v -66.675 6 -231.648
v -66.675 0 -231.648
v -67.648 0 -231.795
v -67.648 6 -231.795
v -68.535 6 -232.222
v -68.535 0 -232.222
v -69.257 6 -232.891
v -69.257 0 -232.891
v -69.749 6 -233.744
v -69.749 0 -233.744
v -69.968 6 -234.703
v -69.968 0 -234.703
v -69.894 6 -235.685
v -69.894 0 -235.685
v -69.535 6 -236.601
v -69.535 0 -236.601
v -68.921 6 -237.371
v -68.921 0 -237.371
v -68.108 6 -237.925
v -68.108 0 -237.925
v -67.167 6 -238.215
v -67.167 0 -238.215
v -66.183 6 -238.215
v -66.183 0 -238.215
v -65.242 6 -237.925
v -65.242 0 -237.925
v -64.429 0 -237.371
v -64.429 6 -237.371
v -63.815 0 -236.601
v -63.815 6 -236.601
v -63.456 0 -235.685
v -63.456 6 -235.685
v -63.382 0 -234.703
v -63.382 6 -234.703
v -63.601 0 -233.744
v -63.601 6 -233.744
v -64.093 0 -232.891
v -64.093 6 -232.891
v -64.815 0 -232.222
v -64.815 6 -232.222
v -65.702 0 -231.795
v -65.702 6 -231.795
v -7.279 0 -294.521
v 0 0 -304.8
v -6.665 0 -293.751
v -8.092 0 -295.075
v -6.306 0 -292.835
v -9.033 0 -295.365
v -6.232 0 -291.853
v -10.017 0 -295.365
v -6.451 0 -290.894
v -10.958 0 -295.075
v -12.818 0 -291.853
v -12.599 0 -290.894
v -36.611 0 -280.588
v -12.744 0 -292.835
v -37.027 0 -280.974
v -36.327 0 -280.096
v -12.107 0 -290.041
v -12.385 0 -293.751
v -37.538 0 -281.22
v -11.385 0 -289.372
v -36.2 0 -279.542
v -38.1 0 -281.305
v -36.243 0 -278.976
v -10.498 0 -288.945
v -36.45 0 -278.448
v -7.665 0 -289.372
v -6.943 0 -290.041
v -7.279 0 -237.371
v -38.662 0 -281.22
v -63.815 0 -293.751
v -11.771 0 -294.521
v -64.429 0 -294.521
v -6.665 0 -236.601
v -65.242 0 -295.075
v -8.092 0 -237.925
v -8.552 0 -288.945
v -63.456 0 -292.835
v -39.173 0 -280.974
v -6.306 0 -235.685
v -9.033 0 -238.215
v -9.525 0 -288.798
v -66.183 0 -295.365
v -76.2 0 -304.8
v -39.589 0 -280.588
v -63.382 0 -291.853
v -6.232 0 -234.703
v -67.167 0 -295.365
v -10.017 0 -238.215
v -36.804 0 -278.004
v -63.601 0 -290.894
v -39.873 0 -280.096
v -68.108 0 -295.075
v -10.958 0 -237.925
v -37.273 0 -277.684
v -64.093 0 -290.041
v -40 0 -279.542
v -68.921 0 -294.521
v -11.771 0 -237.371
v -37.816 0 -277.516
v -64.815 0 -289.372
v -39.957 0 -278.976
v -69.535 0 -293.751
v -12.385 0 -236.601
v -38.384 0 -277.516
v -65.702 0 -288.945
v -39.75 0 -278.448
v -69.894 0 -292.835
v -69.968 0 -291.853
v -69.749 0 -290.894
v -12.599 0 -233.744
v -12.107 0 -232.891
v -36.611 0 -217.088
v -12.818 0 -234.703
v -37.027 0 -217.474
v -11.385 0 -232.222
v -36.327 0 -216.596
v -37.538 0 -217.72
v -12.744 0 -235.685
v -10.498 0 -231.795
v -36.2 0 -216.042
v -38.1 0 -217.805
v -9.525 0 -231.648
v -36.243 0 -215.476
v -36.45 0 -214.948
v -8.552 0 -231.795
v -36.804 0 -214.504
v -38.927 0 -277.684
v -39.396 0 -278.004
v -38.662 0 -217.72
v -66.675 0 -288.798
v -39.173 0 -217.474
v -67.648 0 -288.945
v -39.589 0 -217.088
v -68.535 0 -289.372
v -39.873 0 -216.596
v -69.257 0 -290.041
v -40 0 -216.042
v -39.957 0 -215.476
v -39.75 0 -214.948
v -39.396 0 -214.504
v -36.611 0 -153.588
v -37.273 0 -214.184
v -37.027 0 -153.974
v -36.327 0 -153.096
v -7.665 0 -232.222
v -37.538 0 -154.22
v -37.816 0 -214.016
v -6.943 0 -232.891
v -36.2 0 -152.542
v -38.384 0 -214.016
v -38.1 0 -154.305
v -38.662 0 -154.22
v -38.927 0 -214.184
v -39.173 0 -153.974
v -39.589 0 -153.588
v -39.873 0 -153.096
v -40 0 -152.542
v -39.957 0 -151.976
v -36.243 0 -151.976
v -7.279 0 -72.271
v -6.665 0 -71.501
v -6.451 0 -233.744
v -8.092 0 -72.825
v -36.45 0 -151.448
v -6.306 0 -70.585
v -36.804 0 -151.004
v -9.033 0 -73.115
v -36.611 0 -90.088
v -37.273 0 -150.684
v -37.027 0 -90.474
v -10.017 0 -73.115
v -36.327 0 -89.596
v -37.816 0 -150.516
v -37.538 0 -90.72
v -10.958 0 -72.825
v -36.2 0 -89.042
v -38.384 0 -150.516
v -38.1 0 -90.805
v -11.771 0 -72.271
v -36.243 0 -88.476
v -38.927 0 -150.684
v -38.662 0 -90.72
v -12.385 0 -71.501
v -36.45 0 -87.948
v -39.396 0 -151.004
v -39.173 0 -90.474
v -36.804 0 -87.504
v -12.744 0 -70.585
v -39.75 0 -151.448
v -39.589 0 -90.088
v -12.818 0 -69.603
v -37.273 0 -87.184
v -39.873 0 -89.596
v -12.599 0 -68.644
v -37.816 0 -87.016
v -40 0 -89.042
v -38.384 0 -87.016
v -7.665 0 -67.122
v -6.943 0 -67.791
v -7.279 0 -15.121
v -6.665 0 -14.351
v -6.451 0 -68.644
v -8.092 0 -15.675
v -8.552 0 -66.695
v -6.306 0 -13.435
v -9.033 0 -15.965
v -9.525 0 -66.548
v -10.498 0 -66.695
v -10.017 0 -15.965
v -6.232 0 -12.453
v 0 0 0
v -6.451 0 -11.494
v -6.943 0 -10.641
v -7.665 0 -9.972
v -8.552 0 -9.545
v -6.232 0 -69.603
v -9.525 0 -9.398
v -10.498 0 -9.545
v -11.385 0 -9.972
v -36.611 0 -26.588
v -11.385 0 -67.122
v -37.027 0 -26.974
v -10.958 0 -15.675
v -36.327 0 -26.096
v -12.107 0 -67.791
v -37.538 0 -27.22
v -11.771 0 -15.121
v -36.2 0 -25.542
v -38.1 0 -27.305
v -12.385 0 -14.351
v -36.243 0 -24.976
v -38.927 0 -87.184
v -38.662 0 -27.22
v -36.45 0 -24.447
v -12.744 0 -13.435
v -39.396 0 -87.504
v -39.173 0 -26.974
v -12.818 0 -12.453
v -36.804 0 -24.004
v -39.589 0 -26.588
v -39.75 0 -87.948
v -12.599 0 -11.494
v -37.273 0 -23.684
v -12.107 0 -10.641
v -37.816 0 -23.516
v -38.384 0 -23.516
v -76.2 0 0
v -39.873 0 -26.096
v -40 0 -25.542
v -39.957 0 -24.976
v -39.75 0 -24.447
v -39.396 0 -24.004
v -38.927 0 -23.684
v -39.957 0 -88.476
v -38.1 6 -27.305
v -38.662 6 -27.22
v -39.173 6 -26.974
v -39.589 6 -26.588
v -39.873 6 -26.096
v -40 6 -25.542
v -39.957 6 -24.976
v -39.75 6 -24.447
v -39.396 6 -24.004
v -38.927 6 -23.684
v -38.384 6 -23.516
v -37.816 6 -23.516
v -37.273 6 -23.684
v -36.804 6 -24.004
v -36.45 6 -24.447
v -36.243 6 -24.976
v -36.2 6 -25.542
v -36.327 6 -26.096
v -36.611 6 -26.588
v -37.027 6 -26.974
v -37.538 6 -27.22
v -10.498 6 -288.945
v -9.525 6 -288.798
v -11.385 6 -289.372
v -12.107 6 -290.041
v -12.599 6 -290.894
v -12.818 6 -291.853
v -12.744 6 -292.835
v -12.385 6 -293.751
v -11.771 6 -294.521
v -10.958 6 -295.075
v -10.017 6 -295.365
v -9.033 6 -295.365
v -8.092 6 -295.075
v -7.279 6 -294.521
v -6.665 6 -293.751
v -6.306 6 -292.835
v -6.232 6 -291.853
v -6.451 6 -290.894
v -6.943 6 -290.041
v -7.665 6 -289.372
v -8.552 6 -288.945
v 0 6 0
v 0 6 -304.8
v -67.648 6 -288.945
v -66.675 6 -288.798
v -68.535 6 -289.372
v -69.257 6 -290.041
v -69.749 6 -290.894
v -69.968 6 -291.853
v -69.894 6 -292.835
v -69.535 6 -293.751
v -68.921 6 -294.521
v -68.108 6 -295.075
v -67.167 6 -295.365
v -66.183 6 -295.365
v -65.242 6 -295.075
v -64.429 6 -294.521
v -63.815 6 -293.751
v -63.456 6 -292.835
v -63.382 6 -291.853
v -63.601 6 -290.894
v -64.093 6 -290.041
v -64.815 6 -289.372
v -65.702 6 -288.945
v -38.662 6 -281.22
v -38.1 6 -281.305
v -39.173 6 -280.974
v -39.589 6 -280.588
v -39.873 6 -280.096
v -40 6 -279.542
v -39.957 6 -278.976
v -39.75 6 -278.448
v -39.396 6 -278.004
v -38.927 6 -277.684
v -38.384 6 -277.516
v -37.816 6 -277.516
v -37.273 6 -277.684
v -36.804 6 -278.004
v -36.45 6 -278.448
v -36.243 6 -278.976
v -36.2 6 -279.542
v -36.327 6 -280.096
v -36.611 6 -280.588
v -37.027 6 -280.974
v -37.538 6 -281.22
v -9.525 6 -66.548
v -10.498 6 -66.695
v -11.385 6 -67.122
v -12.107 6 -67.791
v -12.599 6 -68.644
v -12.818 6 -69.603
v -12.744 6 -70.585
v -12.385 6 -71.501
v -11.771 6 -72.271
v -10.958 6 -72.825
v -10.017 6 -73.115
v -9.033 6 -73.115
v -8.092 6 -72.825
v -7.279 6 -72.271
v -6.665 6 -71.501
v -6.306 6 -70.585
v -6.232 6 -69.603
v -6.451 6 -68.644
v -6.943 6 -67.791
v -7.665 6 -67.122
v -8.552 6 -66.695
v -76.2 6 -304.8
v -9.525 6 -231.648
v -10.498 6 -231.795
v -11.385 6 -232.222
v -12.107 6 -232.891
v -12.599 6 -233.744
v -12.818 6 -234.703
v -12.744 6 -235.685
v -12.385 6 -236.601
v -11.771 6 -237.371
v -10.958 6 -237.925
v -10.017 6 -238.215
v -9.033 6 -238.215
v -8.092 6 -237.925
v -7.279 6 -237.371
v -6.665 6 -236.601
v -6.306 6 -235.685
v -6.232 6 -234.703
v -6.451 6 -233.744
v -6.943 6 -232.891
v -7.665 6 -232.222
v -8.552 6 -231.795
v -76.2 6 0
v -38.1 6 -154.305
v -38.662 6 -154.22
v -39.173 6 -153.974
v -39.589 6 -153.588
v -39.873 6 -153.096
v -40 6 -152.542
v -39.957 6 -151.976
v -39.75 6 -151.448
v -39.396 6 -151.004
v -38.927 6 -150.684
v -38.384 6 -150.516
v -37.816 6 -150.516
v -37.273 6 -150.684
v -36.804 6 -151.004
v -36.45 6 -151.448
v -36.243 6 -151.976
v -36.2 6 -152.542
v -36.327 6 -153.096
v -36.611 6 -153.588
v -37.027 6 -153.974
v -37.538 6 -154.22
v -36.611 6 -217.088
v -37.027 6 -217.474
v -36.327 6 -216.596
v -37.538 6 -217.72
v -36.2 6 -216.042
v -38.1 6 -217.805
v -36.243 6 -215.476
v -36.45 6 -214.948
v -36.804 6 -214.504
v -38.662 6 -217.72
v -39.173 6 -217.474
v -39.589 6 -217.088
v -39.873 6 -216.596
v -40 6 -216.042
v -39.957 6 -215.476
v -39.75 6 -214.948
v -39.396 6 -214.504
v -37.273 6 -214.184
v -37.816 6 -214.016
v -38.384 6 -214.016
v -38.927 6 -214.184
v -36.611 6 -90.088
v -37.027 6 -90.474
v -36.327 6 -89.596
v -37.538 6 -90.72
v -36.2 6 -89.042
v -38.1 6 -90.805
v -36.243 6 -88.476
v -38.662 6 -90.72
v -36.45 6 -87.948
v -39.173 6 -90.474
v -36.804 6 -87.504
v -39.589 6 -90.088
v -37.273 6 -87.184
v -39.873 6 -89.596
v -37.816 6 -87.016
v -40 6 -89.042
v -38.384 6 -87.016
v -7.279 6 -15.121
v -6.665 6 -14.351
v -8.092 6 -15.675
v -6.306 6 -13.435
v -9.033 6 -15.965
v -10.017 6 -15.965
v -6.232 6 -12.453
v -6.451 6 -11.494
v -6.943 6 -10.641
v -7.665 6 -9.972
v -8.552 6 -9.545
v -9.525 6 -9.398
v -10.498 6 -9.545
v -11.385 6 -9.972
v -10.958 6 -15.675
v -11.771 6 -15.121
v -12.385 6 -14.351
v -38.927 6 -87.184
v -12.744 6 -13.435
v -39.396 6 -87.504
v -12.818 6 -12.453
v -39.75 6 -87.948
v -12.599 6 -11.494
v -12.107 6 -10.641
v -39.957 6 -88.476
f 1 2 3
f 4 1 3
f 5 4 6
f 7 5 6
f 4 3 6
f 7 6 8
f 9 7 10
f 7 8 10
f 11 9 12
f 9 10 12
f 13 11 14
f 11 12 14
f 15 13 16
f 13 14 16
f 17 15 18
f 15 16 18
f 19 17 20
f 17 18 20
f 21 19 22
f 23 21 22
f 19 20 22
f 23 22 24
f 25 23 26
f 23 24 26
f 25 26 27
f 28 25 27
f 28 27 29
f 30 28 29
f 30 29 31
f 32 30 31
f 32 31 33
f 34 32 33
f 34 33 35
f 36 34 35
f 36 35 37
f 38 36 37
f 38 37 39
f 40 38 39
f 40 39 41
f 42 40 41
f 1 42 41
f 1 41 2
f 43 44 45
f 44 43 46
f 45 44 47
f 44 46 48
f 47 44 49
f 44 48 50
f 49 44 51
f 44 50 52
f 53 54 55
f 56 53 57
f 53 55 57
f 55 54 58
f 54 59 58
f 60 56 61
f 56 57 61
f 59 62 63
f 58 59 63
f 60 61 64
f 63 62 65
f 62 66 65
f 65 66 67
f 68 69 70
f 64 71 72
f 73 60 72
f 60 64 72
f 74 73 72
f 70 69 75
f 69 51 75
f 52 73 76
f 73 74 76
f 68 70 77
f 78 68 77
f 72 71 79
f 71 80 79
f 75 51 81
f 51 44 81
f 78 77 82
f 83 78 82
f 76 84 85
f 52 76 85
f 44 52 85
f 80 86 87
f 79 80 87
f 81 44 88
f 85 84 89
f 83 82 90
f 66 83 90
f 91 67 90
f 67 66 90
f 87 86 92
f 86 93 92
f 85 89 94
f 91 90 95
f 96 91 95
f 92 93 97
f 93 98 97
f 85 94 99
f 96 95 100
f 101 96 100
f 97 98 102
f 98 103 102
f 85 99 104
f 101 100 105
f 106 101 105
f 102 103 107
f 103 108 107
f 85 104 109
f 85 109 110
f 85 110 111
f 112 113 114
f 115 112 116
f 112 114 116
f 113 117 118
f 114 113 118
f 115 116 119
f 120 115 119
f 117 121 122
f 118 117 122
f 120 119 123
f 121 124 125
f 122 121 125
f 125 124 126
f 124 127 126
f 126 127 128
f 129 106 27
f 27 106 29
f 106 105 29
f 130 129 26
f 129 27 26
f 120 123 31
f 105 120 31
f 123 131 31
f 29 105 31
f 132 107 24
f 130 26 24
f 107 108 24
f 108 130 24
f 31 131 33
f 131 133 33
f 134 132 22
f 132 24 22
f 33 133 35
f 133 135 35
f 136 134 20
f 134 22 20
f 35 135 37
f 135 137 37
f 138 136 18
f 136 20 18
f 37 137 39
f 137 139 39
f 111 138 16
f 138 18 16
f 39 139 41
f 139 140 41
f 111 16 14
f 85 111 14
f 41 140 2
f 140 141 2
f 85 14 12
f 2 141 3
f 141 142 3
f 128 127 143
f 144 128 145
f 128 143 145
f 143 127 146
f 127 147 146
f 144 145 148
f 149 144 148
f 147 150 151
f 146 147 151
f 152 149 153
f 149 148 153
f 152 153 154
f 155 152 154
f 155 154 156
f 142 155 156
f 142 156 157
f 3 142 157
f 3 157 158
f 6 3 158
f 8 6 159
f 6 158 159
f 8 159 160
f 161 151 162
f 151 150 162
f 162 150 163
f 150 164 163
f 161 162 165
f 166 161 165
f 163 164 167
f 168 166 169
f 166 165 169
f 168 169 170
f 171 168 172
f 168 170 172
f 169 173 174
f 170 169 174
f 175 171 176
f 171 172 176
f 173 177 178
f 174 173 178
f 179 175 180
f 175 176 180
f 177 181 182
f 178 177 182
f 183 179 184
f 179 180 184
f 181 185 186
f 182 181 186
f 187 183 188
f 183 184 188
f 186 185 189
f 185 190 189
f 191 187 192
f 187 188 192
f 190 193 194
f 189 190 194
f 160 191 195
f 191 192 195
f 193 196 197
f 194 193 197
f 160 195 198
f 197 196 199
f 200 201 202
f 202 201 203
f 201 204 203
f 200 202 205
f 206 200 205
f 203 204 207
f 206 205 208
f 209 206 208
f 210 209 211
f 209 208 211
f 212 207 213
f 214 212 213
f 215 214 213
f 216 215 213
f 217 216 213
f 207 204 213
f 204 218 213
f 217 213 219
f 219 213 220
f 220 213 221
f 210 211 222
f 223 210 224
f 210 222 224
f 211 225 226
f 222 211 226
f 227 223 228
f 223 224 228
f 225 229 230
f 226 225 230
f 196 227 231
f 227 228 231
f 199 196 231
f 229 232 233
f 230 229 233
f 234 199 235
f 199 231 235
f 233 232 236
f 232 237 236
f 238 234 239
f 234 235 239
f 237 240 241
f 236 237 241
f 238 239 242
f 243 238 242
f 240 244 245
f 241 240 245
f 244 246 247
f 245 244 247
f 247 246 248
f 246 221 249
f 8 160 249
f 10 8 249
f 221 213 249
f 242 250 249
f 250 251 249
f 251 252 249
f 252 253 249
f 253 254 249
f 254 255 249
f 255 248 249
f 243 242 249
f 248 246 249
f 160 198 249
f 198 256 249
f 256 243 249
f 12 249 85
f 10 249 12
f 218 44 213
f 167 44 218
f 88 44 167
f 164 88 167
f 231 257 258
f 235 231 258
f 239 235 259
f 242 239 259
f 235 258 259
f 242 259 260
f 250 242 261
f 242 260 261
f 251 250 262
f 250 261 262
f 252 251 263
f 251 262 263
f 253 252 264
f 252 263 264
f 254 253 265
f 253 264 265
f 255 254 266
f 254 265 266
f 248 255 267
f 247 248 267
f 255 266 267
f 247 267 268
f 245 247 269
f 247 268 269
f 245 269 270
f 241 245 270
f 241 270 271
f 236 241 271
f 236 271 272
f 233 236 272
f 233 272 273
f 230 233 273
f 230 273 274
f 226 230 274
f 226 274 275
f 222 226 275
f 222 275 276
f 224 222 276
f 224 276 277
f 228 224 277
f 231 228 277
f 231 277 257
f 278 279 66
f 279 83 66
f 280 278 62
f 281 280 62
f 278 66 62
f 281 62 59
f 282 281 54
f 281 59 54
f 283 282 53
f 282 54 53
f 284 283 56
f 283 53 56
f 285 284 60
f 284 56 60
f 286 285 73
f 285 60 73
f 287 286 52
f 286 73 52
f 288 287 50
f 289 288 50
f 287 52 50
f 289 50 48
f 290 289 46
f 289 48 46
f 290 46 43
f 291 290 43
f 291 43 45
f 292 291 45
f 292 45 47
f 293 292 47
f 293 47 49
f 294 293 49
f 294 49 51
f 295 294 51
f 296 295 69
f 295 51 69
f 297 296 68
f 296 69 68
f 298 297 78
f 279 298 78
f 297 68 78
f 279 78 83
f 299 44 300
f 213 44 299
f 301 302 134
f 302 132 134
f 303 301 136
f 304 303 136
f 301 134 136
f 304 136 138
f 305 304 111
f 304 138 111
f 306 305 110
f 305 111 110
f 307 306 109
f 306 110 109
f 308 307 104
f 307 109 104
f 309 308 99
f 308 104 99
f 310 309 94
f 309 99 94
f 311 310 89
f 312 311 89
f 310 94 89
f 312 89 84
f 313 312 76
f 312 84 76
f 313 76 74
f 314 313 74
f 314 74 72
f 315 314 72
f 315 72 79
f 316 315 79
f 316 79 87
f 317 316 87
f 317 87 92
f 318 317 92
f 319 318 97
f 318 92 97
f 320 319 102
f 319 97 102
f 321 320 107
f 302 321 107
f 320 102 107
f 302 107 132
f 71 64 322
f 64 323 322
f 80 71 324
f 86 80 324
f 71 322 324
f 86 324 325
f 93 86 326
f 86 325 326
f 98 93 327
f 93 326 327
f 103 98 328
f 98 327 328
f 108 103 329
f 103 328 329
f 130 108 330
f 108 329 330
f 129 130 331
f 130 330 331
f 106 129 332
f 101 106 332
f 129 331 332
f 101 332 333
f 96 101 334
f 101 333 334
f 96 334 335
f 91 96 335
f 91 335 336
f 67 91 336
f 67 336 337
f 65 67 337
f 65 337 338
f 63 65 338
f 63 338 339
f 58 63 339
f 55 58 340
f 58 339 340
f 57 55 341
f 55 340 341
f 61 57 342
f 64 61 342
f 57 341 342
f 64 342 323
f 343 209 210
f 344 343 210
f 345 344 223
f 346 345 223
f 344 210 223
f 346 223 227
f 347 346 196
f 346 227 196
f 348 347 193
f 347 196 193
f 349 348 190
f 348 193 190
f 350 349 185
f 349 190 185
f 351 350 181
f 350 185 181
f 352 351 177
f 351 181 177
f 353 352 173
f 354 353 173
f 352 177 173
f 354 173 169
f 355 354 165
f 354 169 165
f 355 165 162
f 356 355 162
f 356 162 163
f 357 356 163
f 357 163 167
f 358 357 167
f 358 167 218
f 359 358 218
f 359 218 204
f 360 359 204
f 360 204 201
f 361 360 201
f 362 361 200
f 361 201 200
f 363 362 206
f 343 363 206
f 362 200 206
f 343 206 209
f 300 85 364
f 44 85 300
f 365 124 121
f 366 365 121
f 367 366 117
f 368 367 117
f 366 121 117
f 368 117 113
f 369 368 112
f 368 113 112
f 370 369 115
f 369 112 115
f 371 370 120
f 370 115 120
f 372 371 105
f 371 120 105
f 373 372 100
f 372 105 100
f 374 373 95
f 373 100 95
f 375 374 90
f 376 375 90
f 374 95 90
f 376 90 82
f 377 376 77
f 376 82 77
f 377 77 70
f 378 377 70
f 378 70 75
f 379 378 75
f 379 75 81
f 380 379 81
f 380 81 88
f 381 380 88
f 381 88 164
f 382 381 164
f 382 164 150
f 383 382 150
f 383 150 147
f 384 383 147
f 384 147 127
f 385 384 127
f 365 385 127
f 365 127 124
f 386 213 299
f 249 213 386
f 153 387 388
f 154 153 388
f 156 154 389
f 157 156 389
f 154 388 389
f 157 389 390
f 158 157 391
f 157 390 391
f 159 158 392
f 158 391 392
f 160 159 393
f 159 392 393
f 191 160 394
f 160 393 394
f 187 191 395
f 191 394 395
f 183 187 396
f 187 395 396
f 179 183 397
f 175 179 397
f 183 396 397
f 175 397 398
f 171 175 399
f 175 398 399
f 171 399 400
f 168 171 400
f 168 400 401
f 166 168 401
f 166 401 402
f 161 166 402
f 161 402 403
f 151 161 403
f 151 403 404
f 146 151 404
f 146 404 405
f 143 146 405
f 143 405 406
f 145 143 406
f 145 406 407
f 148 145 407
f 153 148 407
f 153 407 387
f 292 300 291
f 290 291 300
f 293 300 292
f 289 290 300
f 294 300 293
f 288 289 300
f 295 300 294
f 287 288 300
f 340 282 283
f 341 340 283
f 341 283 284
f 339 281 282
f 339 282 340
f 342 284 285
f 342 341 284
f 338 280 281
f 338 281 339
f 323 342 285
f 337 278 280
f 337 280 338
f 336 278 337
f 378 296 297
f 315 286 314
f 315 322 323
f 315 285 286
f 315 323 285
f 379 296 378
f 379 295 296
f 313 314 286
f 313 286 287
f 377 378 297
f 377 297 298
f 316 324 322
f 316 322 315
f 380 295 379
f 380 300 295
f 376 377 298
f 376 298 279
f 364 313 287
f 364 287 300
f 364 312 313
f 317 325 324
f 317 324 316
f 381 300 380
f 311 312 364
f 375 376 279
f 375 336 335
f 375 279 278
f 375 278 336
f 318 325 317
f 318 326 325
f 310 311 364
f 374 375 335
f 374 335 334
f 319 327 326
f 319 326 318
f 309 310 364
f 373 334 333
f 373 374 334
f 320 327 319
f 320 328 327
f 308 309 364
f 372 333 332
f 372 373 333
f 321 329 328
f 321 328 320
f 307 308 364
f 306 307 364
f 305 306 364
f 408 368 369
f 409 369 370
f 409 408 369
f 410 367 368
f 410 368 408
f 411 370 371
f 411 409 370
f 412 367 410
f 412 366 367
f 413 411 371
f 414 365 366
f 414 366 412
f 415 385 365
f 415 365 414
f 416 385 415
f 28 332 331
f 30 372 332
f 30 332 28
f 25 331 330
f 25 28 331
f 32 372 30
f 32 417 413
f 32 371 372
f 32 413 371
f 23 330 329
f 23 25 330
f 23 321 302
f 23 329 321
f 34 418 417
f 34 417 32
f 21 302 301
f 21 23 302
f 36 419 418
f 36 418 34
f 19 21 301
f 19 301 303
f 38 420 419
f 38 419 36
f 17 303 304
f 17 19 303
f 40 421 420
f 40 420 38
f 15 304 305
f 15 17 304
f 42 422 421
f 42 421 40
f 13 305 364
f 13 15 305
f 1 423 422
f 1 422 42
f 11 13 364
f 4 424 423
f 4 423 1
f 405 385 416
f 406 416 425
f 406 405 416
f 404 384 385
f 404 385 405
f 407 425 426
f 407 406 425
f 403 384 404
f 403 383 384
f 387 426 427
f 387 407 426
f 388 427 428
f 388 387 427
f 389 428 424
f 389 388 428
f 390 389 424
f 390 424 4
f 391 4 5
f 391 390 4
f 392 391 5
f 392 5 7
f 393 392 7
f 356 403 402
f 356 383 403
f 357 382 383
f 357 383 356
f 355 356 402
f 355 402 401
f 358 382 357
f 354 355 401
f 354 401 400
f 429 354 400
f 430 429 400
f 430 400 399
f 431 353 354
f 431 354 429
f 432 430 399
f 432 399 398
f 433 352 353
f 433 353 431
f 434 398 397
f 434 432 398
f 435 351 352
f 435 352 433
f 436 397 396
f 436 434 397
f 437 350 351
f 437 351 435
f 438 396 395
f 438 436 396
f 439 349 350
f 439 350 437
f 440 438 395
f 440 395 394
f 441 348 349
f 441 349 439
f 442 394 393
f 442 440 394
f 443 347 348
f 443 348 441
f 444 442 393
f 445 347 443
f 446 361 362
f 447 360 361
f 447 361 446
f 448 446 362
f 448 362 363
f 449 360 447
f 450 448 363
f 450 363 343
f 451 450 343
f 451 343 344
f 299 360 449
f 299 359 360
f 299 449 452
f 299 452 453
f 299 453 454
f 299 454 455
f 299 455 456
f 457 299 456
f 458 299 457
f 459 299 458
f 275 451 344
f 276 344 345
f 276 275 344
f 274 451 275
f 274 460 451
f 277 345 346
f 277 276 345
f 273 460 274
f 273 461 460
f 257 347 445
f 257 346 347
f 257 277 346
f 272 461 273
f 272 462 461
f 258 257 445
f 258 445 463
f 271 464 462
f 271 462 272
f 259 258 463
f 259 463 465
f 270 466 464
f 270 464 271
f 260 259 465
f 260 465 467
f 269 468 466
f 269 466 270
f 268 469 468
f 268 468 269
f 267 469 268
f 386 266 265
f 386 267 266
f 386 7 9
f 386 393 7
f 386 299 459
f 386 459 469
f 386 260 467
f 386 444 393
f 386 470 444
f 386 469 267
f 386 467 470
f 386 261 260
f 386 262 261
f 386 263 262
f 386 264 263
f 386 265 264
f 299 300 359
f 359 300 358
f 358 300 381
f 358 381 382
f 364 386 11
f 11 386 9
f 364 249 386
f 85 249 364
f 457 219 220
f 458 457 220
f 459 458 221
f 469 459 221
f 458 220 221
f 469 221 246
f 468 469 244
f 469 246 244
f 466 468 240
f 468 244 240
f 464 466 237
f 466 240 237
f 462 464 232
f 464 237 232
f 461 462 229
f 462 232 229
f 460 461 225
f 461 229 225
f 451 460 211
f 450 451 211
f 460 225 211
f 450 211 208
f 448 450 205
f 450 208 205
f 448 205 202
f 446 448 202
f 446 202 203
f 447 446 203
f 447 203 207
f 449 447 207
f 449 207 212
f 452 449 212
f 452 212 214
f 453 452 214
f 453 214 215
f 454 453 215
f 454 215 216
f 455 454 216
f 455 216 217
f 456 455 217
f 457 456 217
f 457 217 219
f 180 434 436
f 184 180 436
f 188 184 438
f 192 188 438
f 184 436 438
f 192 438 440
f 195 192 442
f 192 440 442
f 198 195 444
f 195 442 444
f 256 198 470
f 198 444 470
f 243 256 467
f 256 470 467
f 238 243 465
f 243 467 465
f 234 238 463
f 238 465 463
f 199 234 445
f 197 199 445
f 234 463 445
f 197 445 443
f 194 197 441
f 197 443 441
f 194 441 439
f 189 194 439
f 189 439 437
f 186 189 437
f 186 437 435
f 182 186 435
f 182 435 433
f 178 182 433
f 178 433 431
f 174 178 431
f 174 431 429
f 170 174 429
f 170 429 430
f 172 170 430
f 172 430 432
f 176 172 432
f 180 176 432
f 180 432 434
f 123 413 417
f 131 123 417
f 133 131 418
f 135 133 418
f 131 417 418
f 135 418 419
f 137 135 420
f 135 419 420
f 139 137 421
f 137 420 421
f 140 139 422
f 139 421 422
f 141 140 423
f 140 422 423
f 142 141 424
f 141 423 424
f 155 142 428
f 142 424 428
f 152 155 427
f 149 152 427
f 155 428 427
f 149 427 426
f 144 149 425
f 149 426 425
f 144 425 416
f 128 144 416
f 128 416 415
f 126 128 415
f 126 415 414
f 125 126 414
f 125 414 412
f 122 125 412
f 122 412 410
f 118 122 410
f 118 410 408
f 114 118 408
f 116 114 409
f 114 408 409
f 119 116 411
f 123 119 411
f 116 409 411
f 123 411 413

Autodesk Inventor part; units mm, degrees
ref_plane "YZ Plane" through (0, 0, 0) normal (1, 0, 0) x (0, 1, 0)
ref_plane "XZ Plane" through (0, 0, 0) normal (0, 1, 0) x (-1, 0, 0)
ref_plane "XY Plane" through (0, 0, 0) normal (0, 0, 1) x (1, 0, 0)
sketch "Sketch1" plane through (0, 0, 0) normal (0, 1, 0) x (-1, 0, 0)
  line L0 (0, 0) -> (76.2, 0)
  line L1 (76.2, 0) -> (76.2, -304.8)
  line L2 (76.2, -304.8) -> (0, -304.8)
  line L3 (0, -304.8) -> (0, 0)
  dimension "d0" = 304.8
  dimension "d1" = 76.2
extrude "Extrusion1" add sketch "Sketch1" along normal blind 5.9995
sketch "Sketch2" plane through (0, 5.9995, 0) normal (0, 1, 0) x (1, 0, 0)
  line L0 (0, 0) -> (0, 304.8) projected
  line L1 (-76.2, 0) -> (0, 0) projected
  point P0 (-9.525, 12.7)
  point P1 (-9.525, 69.85)
  dimension "d4" = 57.15
  dimension "d5" = 9.525
  dimension "d13" = 12.7
hole "Hole1" at (-9.525, 5.9995, -12.7) at (-9.525, 5.9995, -69.85) direction (0, -1, 0) diameter 6.604 end through all
sketch "Sketch3" plane through (0, 5.9995, 0) normal (0, 1, 0) x (1, 0, 0)
  line L0 (0, 0) -> (0, 304.8) projected
  line L1 (-76.2, 304.8) -> (-76.2, 0) projected
  line L2 (0, 304.8) -> (-76.2, 304.8) projected
  point P0 (-9.525, 292.1)
  point P1 (-9.525, 234.95)
  point P2 (-66.675, 234.95)
  point P3 (-66.675, 292.1)
  dimension "d14" = 57.15
  dimension "d15" = 9.525
  dimension "d16" = 9.525
  dimension "d17" = 12.7
hole "Hole2" at (-9.525, 5.9995, -292.1) at (-9.525, 5.9995, -234.95) at (-66.675, 5.9995, -234.95) at (-66.675, 5.9995, -292.1) direction (0, -1, 0) diameter 6.604 end through all
sketch "Sketch4" plane through (0, 0, 0) normal (0, -1, 0) x (1, 0, 0)
  line L0 (0, -304.8) -> (-76.2, -304.8) projected
  line L1 (-76.2, 0) -> (0, 0) projected
  line L2 (-76.2, -304.8) -> (-76.2, 0) projected
  point P0 (-38.1, -279.4)
  point P1 (-38.1, -215.9)
  point P2 (-38.1, -152.4)
  point P3 (-38.1, -88.9)
  point P4 (-38.1, -25.4)
  dimension "d25" = 25.4
  dimension "d26" = 25.4
  dimension "d27" = 63.5
  dimension "d28" = 63.5
  dimension "d29" = 63.5
  dimension "d30" = 38.1
hole "Hole3" at (-38.1, 0, -279.4) at (-38.1, 0, -215.9) at (-38.1, 0, -152.4) at (-38.1, 0, -88.9) at (-38.1, 0, -25.4) direction (0, 1, 0) diameter 3.81 end through all clearance for "Flat Head Machine Screw (82)" size "#6" standard "Ansi Unified Screw Threads"
properties part number "GOES_Mount"
